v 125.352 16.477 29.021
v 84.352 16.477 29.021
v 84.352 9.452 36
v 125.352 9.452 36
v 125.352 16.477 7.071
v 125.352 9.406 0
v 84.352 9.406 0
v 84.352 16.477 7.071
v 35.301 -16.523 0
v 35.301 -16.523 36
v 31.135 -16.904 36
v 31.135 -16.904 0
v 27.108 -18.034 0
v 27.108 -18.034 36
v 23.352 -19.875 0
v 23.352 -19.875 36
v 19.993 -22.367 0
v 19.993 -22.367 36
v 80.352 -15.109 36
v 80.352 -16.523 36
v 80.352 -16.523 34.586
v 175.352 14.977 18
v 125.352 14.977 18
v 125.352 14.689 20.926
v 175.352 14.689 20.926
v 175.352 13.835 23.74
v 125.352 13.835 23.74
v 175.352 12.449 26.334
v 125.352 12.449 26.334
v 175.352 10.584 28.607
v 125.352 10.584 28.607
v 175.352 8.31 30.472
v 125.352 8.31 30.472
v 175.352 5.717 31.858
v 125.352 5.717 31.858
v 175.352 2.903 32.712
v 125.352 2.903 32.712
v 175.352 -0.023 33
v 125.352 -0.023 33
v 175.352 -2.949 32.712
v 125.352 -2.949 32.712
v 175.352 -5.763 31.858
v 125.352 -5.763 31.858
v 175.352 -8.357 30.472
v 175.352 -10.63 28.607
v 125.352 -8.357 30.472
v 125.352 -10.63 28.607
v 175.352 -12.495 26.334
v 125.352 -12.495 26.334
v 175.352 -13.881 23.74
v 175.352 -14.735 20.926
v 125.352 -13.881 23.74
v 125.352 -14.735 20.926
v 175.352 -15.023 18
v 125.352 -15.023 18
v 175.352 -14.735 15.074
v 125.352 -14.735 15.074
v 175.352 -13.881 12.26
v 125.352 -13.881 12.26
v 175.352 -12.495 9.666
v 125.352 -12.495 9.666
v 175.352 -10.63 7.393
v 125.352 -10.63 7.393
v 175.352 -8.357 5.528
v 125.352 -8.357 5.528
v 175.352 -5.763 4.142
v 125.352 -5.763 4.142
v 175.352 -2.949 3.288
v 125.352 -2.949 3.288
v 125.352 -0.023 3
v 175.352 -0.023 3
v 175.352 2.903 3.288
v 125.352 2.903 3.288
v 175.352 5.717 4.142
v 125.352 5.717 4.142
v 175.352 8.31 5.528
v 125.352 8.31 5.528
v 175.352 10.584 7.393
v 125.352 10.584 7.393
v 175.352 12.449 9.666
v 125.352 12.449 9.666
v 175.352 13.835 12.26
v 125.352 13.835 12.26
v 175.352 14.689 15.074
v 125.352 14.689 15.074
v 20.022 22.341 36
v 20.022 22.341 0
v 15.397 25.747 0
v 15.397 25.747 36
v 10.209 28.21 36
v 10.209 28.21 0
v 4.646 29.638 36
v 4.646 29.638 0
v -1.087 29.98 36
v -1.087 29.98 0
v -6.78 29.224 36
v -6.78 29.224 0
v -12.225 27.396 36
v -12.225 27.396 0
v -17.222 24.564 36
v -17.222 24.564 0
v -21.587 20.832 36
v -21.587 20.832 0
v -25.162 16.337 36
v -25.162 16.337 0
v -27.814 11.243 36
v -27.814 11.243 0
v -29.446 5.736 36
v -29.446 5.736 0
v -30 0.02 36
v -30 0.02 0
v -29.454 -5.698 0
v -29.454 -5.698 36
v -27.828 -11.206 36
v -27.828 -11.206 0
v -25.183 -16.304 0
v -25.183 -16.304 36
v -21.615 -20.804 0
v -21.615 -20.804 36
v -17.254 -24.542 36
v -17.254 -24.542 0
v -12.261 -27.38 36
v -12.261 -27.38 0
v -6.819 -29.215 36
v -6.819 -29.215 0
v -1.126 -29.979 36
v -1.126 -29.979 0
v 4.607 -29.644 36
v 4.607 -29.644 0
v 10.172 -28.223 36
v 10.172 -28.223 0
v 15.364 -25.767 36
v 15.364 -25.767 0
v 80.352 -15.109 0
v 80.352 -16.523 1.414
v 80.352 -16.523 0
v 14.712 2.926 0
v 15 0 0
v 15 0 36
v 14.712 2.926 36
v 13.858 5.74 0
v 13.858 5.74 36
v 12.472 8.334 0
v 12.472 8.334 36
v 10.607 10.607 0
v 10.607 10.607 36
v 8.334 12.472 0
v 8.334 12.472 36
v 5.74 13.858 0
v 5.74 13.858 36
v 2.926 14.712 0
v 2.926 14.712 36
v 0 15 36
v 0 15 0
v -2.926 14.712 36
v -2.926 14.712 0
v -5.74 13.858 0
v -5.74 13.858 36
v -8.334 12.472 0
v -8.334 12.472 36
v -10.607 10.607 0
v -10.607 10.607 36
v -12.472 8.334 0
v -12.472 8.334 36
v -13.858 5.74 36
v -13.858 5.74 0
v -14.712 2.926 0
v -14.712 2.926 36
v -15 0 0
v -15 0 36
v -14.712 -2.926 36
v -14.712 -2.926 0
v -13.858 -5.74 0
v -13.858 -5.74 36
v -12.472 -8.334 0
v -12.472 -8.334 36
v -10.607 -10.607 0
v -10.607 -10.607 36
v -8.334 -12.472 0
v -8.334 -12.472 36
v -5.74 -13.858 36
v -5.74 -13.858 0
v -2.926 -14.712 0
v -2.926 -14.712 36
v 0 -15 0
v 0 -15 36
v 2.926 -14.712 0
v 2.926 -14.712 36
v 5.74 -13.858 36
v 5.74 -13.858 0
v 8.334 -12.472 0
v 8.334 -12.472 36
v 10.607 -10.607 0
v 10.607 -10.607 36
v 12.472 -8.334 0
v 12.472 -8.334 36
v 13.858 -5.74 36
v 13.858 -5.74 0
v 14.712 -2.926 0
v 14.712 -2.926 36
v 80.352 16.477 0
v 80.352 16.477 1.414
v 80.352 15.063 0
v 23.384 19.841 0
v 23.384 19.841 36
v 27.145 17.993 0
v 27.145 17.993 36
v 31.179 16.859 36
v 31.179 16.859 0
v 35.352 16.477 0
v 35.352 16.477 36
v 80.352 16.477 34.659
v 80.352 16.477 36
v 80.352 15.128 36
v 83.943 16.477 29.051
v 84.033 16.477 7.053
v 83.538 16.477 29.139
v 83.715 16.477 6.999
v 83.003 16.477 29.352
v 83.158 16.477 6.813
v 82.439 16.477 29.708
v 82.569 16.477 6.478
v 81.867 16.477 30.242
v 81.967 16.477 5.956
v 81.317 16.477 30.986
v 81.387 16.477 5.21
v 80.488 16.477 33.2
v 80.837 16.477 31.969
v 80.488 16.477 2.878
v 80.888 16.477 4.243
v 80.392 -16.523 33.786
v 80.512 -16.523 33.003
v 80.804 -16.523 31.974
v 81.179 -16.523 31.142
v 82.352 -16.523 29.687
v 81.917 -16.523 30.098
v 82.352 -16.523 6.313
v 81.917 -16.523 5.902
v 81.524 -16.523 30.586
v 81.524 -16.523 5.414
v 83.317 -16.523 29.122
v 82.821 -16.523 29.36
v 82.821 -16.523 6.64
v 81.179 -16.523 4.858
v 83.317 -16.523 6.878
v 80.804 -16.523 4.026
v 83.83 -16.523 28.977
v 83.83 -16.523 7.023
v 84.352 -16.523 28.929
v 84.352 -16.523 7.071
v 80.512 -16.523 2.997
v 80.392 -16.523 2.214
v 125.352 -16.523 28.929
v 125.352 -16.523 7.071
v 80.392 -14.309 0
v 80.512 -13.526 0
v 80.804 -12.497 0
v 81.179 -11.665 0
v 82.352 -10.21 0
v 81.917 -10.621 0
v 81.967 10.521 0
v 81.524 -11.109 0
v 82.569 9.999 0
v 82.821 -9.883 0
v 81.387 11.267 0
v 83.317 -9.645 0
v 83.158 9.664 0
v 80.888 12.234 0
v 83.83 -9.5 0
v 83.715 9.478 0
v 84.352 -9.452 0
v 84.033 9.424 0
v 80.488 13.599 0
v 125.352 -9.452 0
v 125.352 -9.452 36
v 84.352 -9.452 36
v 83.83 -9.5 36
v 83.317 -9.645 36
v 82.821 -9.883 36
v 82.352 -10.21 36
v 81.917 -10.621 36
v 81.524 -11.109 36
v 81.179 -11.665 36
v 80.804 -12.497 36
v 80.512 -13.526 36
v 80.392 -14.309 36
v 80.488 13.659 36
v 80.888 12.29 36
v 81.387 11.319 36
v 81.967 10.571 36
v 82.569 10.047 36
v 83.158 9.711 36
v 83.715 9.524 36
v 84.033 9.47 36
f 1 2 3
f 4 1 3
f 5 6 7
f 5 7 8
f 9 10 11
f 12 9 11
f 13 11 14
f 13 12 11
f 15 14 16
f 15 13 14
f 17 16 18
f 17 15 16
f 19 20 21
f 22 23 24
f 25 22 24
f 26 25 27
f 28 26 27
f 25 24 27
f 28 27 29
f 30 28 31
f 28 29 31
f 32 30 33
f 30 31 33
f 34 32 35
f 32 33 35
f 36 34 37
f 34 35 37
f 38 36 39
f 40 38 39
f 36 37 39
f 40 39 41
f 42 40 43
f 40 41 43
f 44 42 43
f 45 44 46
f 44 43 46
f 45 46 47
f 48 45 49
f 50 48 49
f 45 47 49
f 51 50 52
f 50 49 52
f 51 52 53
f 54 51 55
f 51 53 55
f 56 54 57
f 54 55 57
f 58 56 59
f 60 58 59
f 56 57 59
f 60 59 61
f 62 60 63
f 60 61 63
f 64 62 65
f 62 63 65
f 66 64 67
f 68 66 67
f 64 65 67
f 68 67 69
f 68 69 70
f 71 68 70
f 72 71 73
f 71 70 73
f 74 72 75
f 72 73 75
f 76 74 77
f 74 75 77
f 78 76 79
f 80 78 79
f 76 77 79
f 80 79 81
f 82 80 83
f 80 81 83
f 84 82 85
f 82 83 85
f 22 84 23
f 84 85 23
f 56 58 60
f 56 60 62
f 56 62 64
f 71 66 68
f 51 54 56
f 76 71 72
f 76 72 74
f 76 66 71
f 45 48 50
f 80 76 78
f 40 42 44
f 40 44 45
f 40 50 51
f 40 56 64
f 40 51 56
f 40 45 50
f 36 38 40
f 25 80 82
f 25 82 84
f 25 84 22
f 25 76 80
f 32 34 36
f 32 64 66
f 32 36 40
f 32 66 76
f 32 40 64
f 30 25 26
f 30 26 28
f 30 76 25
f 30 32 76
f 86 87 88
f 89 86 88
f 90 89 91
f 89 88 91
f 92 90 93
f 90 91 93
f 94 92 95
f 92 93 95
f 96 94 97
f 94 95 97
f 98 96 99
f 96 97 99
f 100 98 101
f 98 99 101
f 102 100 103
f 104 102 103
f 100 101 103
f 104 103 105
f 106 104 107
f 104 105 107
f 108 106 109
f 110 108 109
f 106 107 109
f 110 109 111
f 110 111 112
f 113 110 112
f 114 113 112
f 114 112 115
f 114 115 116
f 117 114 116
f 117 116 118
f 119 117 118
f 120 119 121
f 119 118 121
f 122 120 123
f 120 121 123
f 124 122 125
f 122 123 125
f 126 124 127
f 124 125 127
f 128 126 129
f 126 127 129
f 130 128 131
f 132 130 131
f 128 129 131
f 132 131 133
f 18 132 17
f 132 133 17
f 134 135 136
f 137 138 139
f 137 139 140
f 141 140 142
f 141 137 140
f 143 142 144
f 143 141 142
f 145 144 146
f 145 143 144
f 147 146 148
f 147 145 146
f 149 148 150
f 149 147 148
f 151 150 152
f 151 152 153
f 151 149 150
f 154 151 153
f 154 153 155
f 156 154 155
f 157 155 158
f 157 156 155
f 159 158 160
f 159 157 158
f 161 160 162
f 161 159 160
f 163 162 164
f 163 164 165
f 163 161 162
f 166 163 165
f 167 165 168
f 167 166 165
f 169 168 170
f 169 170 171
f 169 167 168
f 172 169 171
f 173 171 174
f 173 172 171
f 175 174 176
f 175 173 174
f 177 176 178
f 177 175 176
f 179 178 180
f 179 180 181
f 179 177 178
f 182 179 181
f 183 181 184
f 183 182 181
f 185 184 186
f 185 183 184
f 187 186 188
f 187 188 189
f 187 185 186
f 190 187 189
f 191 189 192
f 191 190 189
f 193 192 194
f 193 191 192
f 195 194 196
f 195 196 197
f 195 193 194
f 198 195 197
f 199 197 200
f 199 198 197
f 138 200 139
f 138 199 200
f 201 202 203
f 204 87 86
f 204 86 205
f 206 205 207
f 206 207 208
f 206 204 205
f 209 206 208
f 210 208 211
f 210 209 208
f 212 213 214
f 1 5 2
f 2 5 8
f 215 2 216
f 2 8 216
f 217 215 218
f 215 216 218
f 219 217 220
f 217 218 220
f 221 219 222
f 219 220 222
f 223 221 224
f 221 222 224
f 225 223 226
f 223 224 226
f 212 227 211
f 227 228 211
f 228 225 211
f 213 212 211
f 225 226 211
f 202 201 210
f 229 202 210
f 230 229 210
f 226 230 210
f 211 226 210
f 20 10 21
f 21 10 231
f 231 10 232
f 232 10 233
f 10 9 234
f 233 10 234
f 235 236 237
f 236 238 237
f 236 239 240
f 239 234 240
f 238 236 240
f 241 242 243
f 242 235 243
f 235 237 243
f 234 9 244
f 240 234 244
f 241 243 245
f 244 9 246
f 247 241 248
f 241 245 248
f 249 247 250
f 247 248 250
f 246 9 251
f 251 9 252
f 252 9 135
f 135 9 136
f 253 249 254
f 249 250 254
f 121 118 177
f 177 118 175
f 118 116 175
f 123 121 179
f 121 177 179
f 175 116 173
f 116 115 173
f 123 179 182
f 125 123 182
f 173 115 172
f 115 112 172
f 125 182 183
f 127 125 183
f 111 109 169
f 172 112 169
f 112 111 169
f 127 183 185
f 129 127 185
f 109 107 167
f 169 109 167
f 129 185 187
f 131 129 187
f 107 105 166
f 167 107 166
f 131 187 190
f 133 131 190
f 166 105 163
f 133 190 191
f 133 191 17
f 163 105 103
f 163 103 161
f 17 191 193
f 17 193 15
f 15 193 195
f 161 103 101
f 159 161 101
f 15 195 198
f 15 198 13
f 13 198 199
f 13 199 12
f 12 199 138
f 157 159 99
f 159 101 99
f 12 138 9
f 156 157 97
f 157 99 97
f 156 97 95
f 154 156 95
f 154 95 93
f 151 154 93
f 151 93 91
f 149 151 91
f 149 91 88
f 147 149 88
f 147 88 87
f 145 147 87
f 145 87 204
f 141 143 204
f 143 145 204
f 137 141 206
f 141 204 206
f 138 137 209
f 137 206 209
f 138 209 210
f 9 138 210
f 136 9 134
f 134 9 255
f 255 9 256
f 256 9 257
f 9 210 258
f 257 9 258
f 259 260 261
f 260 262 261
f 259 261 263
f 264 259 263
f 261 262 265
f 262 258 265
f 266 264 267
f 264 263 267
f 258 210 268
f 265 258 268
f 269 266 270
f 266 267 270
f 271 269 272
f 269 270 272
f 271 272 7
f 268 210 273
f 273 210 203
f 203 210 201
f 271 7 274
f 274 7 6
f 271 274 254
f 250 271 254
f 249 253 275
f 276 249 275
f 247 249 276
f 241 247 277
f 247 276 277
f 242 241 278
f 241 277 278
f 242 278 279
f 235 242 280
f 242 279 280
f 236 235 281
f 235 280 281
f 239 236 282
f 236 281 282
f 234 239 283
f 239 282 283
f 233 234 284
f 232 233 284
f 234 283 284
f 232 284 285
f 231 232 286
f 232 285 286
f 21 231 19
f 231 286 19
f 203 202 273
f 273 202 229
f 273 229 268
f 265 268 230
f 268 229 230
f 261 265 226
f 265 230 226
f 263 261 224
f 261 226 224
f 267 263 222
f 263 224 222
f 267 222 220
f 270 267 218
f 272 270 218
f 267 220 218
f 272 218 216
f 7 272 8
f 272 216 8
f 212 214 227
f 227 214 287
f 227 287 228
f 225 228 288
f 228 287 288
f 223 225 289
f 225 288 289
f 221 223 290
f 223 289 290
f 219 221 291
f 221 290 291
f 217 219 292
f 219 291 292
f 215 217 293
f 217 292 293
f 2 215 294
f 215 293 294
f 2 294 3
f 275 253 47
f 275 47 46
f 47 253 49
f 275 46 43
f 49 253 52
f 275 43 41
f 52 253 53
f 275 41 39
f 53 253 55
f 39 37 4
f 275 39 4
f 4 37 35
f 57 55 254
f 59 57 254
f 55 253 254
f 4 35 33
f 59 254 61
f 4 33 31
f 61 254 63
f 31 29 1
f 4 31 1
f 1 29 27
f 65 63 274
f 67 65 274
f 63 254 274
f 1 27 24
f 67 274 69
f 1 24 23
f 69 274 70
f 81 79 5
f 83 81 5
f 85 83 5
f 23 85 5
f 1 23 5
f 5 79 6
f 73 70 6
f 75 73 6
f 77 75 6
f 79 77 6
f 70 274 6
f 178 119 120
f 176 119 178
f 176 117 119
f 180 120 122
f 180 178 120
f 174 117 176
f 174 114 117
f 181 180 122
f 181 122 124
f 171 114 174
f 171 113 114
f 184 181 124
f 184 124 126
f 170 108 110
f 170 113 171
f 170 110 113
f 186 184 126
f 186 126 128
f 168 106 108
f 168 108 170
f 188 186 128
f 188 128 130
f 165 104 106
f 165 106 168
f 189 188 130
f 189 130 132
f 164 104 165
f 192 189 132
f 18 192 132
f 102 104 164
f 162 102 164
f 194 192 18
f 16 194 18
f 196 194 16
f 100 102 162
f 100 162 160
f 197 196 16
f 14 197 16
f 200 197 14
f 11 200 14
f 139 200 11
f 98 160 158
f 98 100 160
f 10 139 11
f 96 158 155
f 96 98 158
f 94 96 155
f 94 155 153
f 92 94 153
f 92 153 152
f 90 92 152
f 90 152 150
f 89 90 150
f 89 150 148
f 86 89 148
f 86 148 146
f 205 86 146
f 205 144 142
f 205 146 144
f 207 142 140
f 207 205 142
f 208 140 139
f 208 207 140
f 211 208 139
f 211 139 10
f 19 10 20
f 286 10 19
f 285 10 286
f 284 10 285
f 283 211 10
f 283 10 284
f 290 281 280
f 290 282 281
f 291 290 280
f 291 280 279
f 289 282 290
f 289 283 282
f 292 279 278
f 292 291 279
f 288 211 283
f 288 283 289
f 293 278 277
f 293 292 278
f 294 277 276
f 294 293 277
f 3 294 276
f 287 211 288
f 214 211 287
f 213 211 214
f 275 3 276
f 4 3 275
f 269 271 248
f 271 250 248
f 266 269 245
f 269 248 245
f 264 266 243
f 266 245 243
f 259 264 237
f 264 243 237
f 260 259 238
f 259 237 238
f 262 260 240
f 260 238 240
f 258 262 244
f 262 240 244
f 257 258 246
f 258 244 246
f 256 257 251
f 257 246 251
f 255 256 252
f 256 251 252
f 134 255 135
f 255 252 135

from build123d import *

# Parameters (mm, degrees)
SKETCH_R        = 15
PAD_DEPTH       = 36
SKETCH001_R     = 15
PAD001_DEPTH    = 50
POCKET002_DEPTH = 45
FILLET_R        = 4
FILLET001_R     = 4


with BuildPart() as part:
    # Sketch → Pad (new body)
    with BuildSketch(Plane.XY):
        with BuildLine():
            ThreePointArc((20.021829, 22.341136), (-29.999994, 0.019609), (19.992607, -22.36729))
            ThreePointArc((35.300511, -16.52309), (27.107731, -18.033819), (19.992607, -22.36729))
            Line((35.300511, -16.52309), (125.352108, -16.52309))
            Line((125.352108, -16.52309), (125.352108, 16.47691))
            Line((125.352108, 16.47691), (35.352108, 16.47691))
            ThreePointArc((20.021829, 22.341136), (27.145303, 17.992999), (35.352108, 16.47691))
        make_face()
        Circle(SKETCH_R, mode=Mode.SUBTRACT)
    extrude(amount=PAD_DEPTH)

    # Sketch001 (on Face2 of Pad) → Pad001 (join)
    with BuildSketch(Plane.YZ.offset(125.352108)):
        with Locations((-0.02309, 18)):
            Circle(SKETCH001_R)
    extrude(amount=PAD001_DEPTH)

    # Sketch008 (on Face3 of Pad001) → Pocket002 (cut)
    with BuildSketch(Plane.YZ.offset(125.352108)):
        Polygon((-16.52309, 36), (-16.52309, 28.928932), (-9.452022, 36), align=None)
        Polygon((-16.52309, 7.071068), (-16.52309, 0), (-9.452022, 0), align=None)
        Polygon((16.52309, 28.975264), (9.452022, 36), (16.47691, 36), align=None)
        Polygon((9.405842, 0), (16.47691, 7.071068), (16.47691, 0), align=None)
    extrude(amount=-POCKET002_DEPTH, mode=Mode.SUBTRACT)

    # Fillet
    fillet_edges = [part.edges().sort_by_distance(p)[0] for p in [
        (80.352108, 12.964466, 32.51057),
        (80.352108, 12.941376, 3.535534),
    ]]
    fillet(fillet_edges, radius=FILLET_R)

    # Fillet001
    fillet001_edges = [part.edges().sort_by_distance(p)[0] for p in [
        (80.352108, -12.987556, 3.535534),
        (80.352108, -12.987556, 32.464466),
    ]]
    fillet(fillet001_edges, radius=FILLET001_R)


solid = part.part
